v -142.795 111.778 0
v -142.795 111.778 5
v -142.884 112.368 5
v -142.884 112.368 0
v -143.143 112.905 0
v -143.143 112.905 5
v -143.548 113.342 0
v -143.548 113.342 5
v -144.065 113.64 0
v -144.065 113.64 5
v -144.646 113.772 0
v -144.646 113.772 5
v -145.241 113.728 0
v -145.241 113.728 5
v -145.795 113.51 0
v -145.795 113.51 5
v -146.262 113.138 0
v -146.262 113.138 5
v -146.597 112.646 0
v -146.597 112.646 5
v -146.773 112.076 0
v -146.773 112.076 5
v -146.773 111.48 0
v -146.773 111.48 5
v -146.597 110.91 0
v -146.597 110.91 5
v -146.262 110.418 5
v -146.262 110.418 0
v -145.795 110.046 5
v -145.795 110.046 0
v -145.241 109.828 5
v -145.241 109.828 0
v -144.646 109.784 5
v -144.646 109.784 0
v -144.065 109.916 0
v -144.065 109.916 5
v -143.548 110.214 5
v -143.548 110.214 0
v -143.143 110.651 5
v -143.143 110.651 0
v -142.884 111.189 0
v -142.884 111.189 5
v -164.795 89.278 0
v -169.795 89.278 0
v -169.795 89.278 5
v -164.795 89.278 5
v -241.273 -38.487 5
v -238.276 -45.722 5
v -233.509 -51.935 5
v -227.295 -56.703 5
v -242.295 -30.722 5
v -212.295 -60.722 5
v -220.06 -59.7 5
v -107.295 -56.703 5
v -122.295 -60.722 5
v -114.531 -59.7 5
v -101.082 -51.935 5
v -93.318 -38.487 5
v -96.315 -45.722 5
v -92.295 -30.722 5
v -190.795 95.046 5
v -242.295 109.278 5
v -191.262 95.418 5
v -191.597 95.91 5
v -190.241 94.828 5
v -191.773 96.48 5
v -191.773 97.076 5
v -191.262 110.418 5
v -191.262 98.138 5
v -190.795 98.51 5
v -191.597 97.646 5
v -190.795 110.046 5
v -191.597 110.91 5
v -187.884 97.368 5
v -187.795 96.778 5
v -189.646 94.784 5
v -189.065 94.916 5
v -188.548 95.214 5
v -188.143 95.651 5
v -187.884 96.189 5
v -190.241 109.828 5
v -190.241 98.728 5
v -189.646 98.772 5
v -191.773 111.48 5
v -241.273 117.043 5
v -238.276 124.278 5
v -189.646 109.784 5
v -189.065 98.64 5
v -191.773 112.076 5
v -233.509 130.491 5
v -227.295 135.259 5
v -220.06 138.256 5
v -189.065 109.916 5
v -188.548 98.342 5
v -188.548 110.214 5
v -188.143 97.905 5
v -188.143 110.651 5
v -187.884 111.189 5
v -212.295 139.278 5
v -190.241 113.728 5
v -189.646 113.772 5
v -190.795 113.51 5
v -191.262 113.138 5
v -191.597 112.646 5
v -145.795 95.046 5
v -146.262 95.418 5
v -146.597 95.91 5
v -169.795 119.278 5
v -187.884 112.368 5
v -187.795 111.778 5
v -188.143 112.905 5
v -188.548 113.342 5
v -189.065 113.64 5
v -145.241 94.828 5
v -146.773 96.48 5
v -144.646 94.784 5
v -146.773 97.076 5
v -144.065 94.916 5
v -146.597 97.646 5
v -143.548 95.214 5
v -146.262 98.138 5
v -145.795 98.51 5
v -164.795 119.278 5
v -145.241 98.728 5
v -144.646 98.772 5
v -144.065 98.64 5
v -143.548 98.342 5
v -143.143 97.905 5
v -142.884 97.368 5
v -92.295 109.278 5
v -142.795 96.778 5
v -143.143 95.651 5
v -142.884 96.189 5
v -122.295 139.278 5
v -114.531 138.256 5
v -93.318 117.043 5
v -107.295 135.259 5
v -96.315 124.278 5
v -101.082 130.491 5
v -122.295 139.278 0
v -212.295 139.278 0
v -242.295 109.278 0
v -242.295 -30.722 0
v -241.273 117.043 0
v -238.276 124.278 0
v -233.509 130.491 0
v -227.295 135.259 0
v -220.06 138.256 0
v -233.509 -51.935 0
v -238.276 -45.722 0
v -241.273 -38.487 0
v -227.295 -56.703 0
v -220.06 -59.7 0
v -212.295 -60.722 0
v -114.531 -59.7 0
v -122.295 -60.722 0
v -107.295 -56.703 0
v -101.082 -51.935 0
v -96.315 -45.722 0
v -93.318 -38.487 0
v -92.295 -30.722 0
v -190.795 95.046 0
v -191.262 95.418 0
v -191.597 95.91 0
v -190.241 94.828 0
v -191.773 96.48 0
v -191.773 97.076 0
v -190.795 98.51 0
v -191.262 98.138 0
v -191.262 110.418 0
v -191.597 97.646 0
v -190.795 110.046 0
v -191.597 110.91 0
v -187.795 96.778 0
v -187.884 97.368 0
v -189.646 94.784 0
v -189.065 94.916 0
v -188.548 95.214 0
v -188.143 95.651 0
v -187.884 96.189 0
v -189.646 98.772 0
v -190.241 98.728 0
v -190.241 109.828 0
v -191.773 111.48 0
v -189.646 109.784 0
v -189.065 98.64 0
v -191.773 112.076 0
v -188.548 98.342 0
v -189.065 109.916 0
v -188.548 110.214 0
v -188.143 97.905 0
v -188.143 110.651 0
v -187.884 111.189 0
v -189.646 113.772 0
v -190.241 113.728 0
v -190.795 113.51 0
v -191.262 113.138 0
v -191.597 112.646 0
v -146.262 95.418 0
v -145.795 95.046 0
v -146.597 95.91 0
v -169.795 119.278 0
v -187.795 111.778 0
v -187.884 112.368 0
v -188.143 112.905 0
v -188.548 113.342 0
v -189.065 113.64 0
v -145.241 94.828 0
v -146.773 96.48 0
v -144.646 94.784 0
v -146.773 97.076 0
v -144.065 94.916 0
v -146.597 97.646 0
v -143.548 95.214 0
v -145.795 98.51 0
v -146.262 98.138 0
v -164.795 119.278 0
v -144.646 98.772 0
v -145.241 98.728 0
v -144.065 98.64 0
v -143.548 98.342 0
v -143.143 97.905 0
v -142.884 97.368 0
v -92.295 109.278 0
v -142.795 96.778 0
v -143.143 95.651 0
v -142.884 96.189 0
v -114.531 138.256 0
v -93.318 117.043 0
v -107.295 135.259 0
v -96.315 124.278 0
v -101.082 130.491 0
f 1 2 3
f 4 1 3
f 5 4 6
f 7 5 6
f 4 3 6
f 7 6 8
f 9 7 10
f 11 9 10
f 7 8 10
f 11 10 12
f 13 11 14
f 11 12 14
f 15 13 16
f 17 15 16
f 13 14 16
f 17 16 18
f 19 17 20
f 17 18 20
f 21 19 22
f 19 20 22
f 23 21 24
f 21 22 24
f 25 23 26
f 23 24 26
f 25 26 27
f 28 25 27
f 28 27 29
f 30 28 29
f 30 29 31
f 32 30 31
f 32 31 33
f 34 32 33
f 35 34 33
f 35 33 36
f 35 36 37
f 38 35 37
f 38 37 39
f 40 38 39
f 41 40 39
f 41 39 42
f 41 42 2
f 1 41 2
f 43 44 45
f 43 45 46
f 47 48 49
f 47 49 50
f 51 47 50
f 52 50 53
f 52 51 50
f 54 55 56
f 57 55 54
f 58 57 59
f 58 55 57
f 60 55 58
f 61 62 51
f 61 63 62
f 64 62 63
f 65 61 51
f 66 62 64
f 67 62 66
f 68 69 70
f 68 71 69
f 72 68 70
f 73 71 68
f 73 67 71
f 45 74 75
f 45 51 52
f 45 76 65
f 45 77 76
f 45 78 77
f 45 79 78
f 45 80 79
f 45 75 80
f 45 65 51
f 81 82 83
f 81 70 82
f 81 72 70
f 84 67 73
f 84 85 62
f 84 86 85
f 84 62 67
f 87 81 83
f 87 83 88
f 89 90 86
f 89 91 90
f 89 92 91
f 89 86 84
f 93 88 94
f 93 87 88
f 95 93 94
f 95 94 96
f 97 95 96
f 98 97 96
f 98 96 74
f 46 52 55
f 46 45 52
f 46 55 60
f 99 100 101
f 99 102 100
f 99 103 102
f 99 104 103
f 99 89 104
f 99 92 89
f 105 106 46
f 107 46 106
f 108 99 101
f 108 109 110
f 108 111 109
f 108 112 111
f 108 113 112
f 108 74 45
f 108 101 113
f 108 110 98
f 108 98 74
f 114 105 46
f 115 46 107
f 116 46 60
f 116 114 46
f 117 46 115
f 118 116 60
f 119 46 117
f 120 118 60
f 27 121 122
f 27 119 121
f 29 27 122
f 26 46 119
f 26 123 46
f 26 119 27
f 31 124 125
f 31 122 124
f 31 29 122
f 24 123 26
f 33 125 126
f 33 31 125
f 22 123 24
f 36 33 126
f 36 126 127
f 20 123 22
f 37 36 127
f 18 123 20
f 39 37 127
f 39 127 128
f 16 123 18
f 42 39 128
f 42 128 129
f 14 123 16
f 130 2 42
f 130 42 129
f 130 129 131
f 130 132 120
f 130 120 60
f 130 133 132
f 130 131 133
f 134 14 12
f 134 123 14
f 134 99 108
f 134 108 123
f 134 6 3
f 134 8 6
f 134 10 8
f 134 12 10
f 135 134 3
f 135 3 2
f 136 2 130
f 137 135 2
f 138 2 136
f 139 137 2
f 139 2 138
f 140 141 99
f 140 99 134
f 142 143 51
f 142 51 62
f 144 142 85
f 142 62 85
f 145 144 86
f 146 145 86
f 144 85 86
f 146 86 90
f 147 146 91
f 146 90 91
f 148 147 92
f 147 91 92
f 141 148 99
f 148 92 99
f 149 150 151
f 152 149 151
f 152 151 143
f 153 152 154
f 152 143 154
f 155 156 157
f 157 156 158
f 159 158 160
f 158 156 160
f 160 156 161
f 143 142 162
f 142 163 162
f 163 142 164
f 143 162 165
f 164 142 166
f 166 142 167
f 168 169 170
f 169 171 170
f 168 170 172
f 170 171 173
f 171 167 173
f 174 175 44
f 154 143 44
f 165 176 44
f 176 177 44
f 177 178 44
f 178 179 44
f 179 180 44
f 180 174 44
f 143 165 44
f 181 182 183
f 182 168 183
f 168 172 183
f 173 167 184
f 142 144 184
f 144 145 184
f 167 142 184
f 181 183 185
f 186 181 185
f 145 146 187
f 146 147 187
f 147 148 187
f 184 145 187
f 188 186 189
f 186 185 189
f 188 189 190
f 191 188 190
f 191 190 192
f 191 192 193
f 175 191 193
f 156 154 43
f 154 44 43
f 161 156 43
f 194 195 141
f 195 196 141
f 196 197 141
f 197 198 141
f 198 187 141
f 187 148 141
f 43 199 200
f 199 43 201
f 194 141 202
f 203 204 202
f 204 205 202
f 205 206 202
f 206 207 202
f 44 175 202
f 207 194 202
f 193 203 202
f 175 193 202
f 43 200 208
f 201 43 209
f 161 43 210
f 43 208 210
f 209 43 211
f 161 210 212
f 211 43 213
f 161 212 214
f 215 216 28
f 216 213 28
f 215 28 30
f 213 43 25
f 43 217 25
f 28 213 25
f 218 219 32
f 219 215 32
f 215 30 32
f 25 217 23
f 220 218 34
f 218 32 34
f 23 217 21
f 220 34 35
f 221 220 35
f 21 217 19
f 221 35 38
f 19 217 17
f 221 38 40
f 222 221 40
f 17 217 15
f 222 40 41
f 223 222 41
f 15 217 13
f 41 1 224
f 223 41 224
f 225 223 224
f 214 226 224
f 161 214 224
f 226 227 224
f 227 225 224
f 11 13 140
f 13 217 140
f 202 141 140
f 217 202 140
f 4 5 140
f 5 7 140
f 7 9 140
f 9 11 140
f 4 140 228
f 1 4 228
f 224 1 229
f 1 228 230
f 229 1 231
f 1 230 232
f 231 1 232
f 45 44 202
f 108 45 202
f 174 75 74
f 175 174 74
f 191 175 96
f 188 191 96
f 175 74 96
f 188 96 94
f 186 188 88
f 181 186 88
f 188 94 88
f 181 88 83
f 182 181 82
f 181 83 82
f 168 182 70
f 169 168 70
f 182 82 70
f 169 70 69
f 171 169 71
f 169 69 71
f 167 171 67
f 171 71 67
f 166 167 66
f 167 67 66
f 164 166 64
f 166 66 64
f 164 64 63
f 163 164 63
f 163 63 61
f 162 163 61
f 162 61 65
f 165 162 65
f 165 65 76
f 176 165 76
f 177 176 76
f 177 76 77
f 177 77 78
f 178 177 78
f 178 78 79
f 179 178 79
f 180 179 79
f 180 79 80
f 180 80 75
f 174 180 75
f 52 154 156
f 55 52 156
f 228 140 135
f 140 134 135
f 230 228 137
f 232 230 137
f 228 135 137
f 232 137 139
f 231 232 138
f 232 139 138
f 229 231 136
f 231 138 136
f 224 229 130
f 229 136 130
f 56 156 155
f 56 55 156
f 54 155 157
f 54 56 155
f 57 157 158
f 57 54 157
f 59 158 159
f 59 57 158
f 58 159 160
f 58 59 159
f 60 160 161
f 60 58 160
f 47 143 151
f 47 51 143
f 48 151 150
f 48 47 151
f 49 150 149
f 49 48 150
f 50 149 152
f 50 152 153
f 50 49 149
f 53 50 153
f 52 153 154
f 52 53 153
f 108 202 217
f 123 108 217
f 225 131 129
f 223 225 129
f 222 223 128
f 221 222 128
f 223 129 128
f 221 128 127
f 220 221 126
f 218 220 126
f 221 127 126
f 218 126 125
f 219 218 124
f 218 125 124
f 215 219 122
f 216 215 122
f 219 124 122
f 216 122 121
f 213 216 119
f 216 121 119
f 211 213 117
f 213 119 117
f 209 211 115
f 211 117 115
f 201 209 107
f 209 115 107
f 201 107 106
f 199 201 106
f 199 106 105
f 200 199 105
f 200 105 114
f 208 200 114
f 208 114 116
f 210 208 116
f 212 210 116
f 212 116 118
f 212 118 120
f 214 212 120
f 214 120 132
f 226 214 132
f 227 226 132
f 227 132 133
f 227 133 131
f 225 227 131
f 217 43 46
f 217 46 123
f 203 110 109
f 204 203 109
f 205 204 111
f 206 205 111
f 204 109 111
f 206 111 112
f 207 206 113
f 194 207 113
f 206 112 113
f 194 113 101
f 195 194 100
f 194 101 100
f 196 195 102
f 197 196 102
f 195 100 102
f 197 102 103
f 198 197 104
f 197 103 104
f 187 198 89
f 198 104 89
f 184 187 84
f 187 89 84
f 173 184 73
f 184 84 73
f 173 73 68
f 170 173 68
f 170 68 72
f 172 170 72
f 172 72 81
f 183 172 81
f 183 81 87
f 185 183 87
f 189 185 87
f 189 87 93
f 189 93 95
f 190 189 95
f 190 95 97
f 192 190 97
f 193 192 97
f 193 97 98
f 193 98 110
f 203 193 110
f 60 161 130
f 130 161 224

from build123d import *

# Parameters (mm, degrees)
CROQUIS1_W              = 150
CROQUIS1_H              = 200
CROQUIS1_W_2            = 5
CROQUIS1_H_2            = 30
SALIENTE_EXTRUIR1_DEPTH = 5
REDONDEO1_R             = 30
CORTAR_EXTRUIR1_REACH   = 281.518
CROQUIS2_R              = 2


with BuildPart() as part:
    # Croquis1 → Saliente-Extruir1 (new body)
    with BuildSketch(Plane.XY):
        with Locations((-167.295474365, 39.278017241)):
            Rectangle(CROQUIS1_W, CROQUIS1_H)
        with Locations((-167.295474365, 104.278017241)):
            Rectangle(CROQUIS1_W_2, CROQUIS1_H_2, mode=Mode.SUBTRACT)
    extrude(amount=SALIENTE_EXTRUIR1_DEPTH)

    # Redondeo1
    redondeo1_edges = [part.edges().sort_by_distance(p)[0] for p in [
        (-242.295474365, 139.278017241, 2.5),
        (-92.295474365, 139.278017241, 2.5),
        (-92.295474365, -60.721982759, 2.5),
        (-242.295474365, -60.721982759, 2.5),
    ]]
    fillet(redondeo1_edges, radius=REDONDEO1_R)

    # Croquis2 → Cortar-Extruir1 (cut, up to next)
    with BuildSketch(Plane.XY.offset(5), mode=Mode.PRIVATE) as cortar_extruir1_sk1:
        with Locations((-144.795474365, 111.778017241)):
            Circle(CROQUIS2_R)
    cortar_extruir1_tool1 = extrude(cortar_extruir1_sk1.sketch, amount=-CORTAR_EXTRUIR1_REACH, mode=Mode.PRIVATE) & part.part
    # Croquis2 → Cortar-Extruir1 (cut, up to next)
    with BuildSketch(Plane.XY.offset(5), mode=Mode.PRIVATE) as cortar_extruir1_sk2:
        with Locations((-189.795474365, 111.778017241)):
            Circle(CROQUIS2_R)
    cortar_extruir1_tool2 = extrude(cortar_extruir1_sk2.sketch, amount=-CORTAR_EXTRUIR1_REACH, mode=Mode.PRIVATE) & part.part
    # Croquis2 → Cortar-Extruir1 (cut, up to next)
    with BuildSketch(Plane.XY.offset(5), mode=Mode.PRIVATE) as cortar_extruir1_sk3:
        with Locations((-189.795474365, 96.778017241)):
            Circle(CROQUIS2_R)
    cortar_extruir1_tool3 = extrude(cortar_extruir1_sk3.sketch, amount=-CORTAR_EXTRUIR1_REACH, mode=Mode.PRIVATE) & part.part
    # Croquis2 → Cortar-Extruir1 (cut, up to next)
    with BuildSketch(Plane.XY.offset(5), mode=Mode.PRIVATE) as cortar_extruir1_sk4:
        with Locations((-144.795474365, 96.778017241)):
            Circle(CROQUIS2_R)
    cortar_extruir1_tool4 = extrude(cortar_extruir1_sk4.sketch, amount=-CORTAR_EXTRUIR1_REACH, mode=Mode.PRIVATE) & part.part
    add(cortar_extruir1_tool1.solids().sort_by_distance((-144.795474, 111.778017, 5))[0], mode=Mode.SUBTRACT)
    add(cortar_extruir1_tool2.solids().sort_by_distance((-189.795474, 111.778017, 5))[0], mode=Mode.SUBTRACT)
    add(cortar_extruir1_tool3.solids().sort_by_distance((-189.795474, 96.778017, 5))[0], mode=Mode.SUBTRACT)
    add(cortar_extruir1_tool4.solids().sort_by_distance((-144.795474, 96.778017, 5))[0], mode=Mode.SUBTRACT)


solid = part.part
